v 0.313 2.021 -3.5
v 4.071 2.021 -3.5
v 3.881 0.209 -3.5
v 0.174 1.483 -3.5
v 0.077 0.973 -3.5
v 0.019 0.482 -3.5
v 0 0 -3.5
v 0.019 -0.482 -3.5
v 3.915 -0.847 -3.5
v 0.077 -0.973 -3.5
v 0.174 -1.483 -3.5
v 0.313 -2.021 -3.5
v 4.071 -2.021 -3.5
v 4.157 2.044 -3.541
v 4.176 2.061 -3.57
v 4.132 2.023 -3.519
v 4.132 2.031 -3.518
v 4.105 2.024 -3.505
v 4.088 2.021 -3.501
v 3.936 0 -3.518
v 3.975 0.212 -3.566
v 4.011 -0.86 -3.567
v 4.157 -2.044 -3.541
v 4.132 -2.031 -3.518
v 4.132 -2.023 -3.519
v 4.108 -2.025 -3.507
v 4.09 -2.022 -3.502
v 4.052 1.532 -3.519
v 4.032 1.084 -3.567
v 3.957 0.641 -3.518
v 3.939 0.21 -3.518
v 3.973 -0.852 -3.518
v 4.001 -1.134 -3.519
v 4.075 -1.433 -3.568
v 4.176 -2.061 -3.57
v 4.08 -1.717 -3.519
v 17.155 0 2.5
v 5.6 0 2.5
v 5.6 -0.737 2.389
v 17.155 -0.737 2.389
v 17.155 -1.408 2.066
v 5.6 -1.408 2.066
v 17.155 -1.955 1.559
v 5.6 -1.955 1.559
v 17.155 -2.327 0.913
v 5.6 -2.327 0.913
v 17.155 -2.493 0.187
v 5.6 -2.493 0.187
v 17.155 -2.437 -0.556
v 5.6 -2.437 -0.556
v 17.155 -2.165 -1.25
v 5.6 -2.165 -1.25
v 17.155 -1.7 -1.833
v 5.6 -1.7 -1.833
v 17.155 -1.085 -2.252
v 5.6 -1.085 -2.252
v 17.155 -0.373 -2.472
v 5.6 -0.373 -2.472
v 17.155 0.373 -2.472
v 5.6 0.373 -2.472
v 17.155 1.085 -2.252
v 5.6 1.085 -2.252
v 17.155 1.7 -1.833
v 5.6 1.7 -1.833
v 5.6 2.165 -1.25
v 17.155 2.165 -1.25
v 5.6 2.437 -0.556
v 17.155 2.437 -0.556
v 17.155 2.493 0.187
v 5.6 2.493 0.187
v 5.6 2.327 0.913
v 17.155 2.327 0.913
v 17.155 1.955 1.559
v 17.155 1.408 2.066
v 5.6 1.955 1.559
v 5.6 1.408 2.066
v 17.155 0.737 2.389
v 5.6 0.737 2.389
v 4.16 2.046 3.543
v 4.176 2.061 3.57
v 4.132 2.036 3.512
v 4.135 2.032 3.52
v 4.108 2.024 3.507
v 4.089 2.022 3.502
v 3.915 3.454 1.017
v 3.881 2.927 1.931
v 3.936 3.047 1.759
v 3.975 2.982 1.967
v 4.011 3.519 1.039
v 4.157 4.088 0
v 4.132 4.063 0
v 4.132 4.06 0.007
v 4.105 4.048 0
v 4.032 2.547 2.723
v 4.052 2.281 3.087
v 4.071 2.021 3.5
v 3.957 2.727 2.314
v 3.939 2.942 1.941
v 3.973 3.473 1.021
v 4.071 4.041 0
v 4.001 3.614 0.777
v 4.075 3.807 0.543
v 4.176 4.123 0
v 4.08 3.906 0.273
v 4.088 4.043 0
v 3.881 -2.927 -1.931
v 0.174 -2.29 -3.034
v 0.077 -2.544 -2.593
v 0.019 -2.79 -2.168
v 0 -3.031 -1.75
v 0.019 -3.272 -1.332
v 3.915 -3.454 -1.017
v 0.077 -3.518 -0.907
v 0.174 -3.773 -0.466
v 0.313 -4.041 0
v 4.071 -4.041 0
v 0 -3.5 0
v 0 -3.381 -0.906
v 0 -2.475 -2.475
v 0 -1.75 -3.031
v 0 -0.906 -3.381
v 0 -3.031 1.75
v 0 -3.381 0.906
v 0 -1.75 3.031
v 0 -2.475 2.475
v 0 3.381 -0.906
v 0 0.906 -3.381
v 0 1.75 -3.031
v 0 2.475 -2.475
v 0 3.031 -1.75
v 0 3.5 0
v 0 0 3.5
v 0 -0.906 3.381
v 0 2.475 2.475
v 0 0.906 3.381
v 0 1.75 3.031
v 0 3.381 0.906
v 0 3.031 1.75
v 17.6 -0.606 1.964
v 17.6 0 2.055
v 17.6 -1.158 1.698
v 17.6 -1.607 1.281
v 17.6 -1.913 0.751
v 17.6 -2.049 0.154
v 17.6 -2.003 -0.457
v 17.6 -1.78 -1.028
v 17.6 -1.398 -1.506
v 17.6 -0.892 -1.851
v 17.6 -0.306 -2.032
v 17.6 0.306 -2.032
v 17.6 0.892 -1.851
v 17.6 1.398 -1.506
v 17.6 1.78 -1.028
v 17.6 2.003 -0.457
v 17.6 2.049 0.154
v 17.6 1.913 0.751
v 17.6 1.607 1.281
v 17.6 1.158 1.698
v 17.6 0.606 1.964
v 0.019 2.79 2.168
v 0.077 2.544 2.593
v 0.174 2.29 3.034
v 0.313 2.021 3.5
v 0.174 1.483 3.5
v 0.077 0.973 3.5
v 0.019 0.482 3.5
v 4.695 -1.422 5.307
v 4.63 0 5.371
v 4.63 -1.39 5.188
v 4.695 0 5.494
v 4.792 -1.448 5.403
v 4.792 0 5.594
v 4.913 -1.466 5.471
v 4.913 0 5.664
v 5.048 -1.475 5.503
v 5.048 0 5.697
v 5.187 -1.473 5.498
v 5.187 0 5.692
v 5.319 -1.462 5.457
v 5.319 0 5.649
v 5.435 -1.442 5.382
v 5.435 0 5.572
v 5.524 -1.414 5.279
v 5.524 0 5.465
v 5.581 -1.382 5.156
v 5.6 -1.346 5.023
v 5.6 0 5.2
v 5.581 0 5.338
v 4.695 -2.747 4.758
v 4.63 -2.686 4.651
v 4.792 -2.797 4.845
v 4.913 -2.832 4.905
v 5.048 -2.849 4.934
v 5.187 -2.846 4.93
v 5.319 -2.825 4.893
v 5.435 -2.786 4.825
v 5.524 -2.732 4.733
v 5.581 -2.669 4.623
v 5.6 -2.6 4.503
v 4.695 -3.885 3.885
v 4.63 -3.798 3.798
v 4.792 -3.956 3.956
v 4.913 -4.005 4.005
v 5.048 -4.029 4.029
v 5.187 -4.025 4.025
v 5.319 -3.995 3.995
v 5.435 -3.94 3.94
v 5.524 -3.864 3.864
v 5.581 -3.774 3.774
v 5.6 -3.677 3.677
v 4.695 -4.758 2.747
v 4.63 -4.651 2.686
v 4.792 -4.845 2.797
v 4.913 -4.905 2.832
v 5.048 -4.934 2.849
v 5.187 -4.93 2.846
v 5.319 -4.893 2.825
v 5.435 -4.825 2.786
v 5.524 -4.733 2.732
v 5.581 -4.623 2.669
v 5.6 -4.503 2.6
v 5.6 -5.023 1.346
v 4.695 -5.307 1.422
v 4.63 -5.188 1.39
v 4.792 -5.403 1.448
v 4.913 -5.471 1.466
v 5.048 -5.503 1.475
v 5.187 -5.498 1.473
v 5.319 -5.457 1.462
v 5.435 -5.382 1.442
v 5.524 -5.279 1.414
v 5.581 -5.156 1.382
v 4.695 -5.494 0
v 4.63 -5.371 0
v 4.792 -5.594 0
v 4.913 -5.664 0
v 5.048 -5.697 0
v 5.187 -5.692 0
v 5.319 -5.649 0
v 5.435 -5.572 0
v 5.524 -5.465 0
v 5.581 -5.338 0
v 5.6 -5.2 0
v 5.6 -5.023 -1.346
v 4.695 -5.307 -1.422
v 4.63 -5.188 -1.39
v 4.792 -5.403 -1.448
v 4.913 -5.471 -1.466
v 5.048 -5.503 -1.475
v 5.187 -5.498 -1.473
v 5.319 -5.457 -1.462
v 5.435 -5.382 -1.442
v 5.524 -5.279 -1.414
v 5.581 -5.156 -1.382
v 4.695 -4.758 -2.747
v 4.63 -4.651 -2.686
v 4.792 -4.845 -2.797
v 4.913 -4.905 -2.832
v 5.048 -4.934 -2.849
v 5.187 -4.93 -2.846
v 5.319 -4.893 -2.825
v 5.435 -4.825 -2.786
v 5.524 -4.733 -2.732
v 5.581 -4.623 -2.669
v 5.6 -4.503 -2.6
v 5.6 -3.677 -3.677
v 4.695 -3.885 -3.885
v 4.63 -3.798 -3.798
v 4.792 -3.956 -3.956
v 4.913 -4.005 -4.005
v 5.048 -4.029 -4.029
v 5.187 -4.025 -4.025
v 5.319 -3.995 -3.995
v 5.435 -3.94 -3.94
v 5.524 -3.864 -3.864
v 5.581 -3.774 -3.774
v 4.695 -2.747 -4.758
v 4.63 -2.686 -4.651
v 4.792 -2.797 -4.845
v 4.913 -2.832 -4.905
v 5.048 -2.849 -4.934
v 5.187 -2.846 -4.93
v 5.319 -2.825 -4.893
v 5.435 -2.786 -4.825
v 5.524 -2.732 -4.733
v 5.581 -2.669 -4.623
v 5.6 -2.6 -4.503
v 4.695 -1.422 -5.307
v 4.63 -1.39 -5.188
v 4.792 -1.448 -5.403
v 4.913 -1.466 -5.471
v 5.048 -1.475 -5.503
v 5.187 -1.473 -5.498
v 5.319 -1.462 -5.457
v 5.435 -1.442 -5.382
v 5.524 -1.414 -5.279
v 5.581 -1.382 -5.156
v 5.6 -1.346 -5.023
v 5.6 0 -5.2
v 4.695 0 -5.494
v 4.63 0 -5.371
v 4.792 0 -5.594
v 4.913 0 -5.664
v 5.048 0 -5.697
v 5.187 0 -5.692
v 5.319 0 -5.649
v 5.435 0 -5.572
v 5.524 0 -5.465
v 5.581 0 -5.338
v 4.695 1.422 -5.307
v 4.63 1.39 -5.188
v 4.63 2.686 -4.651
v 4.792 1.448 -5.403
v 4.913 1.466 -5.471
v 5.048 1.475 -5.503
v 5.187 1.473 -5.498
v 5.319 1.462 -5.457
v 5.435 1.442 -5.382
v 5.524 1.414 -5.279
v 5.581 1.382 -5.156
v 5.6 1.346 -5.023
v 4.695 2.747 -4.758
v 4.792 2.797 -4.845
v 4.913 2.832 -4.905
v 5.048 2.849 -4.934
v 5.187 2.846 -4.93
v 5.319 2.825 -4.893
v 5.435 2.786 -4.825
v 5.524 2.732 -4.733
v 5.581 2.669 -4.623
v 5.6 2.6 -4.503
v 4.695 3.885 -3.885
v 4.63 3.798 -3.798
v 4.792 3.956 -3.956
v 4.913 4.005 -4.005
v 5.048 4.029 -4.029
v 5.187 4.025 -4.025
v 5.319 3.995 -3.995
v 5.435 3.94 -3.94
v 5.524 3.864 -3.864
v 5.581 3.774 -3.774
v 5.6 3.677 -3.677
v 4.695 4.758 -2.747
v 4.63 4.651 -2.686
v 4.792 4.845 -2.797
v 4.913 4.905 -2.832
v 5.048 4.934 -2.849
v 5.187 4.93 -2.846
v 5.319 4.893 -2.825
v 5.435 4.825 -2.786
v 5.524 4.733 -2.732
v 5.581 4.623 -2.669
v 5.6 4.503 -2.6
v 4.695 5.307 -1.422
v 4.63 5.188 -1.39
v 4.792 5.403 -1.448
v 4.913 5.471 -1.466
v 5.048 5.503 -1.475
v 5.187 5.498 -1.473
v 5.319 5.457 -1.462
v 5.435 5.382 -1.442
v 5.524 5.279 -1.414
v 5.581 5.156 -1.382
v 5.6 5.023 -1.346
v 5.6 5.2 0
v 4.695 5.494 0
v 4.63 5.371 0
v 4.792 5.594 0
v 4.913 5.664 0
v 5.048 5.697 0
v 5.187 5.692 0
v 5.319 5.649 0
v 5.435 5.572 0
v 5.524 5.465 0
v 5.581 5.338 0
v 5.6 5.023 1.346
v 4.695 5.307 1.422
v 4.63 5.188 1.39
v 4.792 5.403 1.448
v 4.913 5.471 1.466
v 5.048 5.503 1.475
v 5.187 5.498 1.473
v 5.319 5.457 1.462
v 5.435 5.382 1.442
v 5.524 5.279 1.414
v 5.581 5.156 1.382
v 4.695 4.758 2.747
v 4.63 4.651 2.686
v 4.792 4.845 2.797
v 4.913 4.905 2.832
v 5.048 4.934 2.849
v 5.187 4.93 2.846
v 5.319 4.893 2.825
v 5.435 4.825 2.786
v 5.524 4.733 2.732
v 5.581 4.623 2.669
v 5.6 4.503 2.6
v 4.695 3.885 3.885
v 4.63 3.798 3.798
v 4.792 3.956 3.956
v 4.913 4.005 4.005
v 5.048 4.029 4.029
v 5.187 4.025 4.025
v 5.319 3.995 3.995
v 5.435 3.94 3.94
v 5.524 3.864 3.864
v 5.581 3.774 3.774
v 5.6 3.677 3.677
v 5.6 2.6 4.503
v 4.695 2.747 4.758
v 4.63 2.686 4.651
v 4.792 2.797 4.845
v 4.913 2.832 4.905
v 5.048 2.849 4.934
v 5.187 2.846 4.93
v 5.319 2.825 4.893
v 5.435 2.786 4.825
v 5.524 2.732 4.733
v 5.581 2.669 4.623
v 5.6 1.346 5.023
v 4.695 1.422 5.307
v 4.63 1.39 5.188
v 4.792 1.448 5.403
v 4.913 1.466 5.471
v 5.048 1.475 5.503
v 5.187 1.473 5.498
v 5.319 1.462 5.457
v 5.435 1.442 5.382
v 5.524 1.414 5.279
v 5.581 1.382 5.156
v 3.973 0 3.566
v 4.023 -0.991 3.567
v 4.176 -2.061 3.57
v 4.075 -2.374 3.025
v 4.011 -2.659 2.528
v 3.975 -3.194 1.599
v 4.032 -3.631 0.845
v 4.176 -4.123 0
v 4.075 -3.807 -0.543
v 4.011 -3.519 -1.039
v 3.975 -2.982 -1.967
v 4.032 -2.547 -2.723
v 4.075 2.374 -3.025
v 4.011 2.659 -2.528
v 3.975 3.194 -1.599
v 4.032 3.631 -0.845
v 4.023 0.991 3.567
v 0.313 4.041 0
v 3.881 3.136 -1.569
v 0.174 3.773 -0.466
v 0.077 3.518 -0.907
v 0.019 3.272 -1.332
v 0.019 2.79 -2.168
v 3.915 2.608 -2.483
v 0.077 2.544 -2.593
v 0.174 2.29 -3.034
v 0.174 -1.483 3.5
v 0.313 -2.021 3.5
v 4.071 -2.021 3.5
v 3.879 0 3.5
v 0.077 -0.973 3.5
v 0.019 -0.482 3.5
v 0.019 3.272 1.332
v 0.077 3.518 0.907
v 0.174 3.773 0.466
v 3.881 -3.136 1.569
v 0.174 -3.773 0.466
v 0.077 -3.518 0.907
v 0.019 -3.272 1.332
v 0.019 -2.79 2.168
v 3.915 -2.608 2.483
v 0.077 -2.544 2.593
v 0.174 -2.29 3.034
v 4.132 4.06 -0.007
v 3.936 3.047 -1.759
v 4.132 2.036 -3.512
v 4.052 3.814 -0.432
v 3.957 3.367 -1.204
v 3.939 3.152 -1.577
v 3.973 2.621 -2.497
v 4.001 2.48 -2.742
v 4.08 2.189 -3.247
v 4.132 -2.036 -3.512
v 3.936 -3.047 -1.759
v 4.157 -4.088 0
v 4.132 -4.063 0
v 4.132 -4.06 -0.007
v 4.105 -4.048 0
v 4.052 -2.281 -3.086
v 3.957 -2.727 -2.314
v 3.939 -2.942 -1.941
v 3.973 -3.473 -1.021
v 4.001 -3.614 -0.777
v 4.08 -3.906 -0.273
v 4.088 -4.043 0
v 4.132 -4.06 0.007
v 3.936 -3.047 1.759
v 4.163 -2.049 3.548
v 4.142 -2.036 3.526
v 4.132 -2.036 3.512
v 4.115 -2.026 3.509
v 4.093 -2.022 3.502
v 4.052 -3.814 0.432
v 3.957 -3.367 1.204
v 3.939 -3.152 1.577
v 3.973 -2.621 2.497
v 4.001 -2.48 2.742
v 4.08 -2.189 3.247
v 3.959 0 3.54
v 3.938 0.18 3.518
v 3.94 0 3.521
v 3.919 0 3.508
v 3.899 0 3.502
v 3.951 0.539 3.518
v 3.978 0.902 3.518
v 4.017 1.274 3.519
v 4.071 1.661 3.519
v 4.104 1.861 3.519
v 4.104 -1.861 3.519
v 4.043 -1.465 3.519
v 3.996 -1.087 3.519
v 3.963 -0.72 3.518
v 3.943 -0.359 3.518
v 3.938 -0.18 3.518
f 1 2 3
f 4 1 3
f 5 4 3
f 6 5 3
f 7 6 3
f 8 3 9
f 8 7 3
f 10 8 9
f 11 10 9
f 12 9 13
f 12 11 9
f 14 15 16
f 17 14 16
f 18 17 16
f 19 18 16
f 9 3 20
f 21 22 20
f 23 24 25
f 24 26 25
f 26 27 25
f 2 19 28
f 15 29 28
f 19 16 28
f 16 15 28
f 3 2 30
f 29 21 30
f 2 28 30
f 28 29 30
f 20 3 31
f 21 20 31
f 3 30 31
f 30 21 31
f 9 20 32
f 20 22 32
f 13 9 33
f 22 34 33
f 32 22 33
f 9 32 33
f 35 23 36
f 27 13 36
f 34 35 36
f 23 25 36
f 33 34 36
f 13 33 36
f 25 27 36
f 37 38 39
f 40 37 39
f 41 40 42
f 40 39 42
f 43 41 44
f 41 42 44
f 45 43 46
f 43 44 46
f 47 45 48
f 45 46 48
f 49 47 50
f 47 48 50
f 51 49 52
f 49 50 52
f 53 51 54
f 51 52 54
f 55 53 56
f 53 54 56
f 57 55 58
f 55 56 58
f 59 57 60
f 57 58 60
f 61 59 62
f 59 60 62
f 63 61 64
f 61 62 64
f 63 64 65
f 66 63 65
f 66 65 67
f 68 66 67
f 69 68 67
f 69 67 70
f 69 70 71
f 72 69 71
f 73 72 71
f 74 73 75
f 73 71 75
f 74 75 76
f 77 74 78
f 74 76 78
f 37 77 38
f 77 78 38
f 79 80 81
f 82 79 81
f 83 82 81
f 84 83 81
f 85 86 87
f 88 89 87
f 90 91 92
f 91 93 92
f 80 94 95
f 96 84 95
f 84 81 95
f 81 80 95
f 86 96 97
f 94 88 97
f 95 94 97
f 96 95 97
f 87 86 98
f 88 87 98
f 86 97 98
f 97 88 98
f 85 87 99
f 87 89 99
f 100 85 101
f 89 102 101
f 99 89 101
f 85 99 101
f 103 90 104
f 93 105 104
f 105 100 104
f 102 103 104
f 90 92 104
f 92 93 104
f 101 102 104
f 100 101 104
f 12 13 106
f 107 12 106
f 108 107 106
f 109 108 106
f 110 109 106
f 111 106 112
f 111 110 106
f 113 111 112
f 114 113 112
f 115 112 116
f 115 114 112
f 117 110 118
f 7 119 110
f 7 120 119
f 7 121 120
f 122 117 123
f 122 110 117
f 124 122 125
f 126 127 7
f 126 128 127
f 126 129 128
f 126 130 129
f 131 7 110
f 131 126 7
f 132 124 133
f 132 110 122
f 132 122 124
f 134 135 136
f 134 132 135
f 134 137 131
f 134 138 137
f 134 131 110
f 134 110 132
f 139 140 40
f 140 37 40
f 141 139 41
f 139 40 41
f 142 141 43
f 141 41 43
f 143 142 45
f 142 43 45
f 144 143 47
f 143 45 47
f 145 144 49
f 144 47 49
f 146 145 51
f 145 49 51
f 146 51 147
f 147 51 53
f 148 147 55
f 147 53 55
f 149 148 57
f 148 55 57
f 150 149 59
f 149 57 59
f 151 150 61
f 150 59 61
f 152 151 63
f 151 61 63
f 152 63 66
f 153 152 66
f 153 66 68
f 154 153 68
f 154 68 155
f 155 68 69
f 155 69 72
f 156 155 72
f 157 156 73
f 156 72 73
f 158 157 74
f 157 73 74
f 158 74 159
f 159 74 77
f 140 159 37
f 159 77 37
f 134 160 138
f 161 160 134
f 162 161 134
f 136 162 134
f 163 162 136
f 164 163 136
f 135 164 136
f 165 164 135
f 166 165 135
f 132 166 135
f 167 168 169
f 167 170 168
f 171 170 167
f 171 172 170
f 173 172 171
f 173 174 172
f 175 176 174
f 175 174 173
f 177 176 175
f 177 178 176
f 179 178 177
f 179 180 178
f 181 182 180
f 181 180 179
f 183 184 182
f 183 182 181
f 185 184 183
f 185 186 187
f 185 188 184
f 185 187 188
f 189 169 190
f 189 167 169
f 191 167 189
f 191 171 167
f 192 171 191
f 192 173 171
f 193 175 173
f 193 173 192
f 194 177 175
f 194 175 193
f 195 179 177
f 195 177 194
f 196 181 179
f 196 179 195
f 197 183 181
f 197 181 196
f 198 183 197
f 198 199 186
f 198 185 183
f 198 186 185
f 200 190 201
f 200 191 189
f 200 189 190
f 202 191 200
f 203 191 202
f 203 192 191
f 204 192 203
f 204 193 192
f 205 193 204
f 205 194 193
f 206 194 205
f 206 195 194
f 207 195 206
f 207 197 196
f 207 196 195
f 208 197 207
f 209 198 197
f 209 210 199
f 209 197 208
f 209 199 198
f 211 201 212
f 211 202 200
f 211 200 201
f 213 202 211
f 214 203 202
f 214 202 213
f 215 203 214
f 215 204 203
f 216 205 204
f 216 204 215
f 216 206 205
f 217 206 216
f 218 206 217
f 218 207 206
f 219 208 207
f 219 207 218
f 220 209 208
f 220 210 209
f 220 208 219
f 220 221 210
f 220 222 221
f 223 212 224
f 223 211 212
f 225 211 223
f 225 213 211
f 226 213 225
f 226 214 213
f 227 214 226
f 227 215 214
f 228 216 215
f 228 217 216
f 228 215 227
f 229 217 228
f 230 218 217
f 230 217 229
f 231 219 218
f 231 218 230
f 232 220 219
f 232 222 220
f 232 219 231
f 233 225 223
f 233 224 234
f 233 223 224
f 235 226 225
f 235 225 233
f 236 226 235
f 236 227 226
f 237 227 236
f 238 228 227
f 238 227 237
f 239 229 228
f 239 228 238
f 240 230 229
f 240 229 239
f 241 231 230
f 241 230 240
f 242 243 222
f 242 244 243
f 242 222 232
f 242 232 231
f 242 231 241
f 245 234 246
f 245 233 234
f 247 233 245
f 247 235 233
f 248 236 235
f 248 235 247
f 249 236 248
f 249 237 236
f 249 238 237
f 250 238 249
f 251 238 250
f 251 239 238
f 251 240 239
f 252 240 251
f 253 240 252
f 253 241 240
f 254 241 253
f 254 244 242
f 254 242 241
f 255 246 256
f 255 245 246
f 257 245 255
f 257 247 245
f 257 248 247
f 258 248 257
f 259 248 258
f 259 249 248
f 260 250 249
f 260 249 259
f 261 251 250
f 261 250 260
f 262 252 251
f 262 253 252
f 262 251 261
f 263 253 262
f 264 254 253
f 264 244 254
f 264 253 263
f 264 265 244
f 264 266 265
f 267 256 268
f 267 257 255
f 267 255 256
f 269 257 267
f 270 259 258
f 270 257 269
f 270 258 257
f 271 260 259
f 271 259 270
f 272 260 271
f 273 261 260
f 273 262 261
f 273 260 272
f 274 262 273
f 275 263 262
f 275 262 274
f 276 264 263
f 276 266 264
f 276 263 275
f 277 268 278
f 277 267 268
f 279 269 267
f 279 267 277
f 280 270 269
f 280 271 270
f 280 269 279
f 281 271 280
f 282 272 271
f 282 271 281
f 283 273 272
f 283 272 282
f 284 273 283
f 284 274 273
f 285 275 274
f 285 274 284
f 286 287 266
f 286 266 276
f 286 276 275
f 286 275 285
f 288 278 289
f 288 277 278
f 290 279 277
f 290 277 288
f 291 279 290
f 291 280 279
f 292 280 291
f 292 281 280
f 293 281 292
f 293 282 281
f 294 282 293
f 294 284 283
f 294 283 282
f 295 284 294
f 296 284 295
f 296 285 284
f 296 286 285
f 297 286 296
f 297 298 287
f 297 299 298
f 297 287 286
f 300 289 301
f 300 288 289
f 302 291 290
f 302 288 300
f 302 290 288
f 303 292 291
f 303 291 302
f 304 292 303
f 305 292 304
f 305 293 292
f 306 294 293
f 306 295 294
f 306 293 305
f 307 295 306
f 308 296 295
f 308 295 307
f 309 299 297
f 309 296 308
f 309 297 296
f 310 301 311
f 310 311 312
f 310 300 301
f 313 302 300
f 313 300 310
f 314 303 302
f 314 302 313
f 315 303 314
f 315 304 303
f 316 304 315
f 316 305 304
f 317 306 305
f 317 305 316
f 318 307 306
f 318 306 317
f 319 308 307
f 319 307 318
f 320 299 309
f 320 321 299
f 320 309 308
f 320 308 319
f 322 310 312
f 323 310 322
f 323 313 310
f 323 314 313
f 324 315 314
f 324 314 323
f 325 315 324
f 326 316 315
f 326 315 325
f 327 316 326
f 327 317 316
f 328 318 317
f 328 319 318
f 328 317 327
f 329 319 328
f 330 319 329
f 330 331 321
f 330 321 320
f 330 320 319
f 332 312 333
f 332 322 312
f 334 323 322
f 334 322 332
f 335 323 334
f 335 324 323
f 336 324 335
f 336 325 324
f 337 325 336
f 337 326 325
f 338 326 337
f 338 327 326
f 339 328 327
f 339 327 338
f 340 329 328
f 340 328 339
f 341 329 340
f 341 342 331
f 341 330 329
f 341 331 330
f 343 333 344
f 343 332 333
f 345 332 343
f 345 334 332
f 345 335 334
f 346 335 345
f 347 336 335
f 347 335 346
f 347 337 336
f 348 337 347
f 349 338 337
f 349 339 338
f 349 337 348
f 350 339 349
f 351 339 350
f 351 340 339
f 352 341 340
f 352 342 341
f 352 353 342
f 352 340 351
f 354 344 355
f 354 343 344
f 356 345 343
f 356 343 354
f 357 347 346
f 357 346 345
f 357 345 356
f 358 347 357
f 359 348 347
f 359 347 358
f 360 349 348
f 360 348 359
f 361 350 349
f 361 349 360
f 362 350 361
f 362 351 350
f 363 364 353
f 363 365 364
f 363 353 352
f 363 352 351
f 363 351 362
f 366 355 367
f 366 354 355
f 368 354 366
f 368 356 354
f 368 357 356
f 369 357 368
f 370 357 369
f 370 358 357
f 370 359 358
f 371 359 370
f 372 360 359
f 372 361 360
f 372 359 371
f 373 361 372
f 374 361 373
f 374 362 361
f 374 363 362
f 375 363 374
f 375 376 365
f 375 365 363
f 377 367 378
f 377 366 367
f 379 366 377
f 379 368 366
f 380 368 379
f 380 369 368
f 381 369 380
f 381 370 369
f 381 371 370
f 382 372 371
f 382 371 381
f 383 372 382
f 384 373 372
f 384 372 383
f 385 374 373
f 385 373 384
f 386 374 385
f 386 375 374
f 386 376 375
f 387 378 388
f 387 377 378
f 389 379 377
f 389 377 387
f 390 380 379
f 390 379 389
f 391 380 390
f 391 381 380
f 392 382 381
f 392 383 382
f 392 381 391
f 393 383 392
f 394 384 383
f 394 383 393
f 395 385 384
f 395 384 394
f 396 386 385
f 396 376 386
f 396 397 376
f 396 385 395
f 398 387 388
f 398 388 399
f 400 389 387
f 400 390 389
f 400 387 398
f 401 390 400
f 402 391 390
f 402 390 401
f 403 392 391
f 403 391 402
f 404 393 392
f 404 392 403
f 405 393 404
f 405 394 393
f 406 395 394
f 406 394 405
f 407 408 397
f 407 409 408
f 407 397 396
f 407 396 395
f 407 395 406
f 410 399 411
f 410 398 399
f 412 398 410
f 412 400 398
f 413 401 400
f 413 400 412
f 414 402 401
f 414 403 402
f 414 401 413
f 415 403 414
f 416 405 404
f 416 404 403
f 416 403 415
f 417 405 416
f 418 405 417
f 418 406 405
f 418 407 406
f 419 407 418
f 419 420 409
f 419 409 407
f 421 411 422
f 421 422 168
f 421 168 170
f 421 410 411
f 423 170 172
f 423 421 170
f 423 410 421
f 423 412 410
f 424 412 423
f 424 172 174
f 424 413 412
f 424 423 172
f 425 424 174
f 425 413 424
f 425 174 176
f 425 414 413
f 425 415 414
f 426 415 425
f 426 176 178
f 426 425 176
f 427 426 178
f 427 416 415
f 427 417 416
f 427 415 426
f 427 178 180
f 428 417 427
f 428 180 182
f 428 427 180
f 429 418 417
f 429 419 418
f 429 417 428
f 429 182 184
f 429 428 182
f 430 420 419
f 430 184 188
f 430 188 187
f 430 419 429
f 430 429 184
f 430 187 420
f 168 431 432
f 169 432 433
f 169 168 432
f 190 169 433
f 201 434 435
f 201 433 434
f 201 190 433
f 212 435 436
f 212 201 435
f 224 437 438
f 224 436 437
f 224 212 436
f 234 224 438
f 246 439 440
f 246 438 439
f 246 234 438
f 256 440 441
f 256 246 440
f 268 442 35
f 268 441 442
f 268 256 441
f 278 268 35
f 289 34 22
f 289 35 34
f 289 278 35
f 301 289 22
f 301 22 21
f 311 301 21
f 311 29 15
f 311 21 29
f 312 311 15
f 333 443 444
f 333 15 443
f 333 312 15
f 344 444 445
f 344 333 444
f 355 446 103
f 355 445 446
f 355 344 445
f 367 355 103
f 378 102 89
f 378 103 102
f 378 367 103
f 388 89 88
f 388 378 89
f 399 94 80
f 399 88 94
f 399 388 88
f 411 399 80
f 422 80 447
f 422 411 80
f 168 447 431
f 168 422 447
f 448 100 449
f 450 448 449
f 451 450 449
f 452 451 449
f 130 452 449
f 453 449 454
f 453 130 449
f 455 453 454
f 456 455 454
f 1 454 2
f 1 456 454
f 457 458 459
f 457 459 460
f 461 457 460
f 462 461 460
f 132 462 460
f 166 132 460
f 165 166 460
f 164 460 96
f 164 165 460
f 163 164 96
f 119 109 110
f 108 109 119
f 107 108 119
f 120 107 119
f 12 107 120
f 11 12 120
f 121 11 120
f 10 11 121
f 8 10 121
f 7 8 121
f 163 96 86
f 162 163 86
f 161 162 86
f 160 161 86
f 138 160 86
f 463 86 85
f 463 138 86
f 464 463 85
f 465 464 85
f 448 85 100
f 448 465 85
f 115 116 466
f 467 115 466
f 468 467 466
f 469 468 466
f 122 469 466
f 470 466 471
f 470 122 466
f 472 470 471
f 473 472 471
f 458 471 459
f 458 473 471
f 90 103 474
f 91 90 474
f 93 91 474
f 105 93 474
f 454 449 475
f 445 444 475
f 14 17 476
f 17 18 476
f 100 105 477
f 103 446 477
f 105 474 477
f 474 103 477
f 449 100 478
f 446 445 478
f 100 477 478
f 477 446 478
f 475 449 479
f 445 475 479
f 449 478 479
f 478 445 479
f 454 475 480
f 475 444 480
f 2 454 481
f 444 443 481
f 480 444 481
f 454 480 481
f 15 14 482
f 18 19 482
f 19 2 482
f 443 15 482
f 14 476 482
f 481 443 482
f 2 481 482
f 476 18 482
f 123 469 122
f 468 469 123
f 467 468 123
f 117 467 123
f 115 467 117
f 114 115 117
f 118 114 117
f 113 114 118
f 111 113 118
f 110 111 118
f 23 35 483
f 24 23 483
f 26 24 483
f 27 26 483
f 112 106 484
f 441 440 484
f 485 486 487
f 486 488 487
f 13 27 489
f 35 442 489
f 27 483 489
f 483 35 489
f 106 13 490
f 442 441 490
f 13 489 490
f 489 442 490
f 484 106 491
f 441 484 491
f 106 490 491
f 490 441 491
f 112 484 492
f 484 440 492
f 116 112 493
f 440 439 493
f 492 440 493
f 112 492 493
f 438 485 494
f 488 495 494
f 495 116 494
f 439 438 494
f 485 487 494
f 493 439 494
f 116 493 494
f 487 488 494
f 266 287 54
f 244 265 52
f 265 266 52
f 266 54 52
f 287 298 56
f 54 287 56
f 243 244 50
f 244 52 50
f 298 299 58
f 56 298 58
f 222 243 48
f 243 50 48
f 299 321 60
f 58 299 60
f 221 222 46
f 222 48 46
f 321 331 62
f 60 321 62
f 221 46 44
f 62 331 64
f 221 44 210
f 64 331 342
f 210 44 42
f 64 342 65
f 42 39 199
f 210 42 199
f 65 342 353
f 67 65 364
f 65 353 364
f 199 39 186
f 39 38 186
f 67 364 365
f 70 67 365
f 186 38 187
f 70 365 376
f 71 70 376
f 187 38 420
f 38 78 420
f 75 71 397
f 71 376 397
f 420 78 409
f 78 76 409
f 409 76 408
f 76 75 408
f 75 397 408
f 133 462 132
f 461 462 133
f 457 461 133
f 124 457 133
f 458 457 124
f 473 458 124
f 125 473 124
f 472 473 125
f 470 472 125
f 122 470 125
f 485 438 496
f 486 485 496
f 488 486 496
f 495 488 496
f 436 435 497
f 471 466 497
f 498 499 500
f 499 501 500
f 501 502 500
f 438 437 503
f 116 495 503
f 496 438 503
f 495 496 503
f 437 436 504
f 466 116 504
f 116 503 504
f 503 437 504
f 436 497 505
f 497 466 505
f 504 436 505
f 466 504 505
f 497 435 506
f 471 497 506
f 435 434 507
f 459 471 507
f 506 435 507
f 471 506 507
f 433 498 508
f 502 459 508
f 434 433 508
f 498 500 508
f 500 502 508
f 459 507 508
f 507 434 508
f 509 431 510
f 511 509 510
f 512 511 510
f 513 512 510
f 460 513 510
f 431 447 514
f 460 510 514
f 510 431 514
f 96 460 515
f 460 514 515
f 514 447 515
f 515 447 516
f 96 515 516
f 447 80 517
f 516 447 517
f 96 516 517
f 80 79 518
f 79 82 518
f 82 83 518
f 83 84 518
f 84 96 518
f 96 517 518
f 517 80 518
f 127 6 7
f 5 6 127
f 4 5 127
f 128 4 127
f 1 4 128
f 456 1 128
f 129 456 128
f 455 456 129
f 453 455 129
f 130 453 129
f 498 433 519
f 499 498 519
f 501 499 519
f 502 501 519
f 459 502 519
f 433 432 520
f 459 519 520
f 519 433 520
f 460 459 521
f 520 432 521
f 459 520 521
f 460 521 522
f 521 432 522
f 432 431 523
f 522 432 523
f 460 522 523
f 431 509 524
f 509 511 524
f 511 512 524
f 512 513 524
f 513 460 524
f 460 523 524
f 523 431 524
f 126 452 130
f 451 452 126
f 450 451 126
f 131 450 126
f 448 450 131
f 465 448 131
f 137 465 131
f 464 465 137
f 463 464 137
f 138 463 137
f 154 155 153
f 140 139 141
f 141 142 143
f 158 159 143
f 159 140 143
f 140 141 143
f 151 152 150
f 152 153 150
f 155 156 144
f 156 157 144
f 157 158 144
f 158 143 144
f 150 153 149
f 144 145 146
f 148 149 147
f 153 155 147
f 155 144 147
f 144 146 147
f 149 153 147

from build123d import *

# Parameters (mm, degrees)
BASEHEAD_DEPTH    = 5.6
FLANGEHEXFILLET_R = 0.1


with BuildPart() as part:
    # Sketch1 → BaseHead (new body)
    with BuildSketch(Plane(origin=(0, 0, 0), x_dir=(0, 0, -1), z_dir=(1, 0, 0))):
        Polygon((3.5, 2.020725942), (3.5, -2.020725942), (0, -4.041451884), (-3.5, -2.020725942), (-3.5, 2.020725942), (0, 4.041451884), align=None)
    extrude(amount=BASEHEAD_DEPTH)

    # BodySke → BaseBody (revolve)
    with BuildSketch(Plane.XY, mode=Mode.PRIVATE) as basebody_sk:
        Polygon((0, 0), (17.6, 0), (17.6, 2.055), (17.155, 2.5), (0, 2.5), align=None)
    revolve(basebody_sk.sketch.rotate(Axis((0, 0, 0), (1, 0, 0)), 90), axis=Axis((0, 0, 0), (1, 0, 0)))

    # Sketch3 → HeadChamfer (revolve, cut)
    with BuildSketch(Plane.XY, mode=Mode.PRIVATE) as headchamfer_sk:
        Polygon((0, 3.5), (3.199358737, 9.041451884), (3.199358737, 14.041451884), (-10, 14.041451884), (-10, 3.5), align=None)
    revolve(headchamfer_sk.sketch.rotate(Axis((0, 0, 0), (1, 0, 0)), 90), axis=Axis((0, 0, 0), (1, 0, 0)), mode=Mode.SUBTRACT)

    # Sketch4 → Flange (revolve)
    with BuildSketch(Plane.XY, mode=Mode.PRIVATE) as flange_sk:
        with BuildLine():
            Line((2.675265896, 0), (4.63015369, 5.371010072))
            ThreePointArc((4.63015369, 5.371010072), (5.186824089, 5.692403877), (5.6, 5.2))
            Line((5.6, 5.2), (5.6, 0))
            Line((5.6, 0), (2.675265896, 0))
        make_face()
    revolve(flange_sk.sketch.rotate(Axis((0, 0, 0), (1, 0, 0)), 90), axis=Axis((0, 0, 0), (1, 0, 0)))

    # FlangeHexFillet
    flangehexfillet_edges = [part.edges().sort_by_distance(p)[0] for p in [
        (3.949161716, 0, -3.5),
        (3.949161716, -3.031088913, -1.75),
        (4.001624527, 1.014770503, 3.5),
        (3.949161716, 3.031088913, 1.75),
        (3.949161716, 3.031088913, -1.75),
        (3.949161716, -3.031088913, 1.75),
        (4.001624527, -1.014770503, 3.5),
    ]]
    fillet(flangehexfillet_edges, radius=FLANGEHEXFILLET_R)


solid = part.part
